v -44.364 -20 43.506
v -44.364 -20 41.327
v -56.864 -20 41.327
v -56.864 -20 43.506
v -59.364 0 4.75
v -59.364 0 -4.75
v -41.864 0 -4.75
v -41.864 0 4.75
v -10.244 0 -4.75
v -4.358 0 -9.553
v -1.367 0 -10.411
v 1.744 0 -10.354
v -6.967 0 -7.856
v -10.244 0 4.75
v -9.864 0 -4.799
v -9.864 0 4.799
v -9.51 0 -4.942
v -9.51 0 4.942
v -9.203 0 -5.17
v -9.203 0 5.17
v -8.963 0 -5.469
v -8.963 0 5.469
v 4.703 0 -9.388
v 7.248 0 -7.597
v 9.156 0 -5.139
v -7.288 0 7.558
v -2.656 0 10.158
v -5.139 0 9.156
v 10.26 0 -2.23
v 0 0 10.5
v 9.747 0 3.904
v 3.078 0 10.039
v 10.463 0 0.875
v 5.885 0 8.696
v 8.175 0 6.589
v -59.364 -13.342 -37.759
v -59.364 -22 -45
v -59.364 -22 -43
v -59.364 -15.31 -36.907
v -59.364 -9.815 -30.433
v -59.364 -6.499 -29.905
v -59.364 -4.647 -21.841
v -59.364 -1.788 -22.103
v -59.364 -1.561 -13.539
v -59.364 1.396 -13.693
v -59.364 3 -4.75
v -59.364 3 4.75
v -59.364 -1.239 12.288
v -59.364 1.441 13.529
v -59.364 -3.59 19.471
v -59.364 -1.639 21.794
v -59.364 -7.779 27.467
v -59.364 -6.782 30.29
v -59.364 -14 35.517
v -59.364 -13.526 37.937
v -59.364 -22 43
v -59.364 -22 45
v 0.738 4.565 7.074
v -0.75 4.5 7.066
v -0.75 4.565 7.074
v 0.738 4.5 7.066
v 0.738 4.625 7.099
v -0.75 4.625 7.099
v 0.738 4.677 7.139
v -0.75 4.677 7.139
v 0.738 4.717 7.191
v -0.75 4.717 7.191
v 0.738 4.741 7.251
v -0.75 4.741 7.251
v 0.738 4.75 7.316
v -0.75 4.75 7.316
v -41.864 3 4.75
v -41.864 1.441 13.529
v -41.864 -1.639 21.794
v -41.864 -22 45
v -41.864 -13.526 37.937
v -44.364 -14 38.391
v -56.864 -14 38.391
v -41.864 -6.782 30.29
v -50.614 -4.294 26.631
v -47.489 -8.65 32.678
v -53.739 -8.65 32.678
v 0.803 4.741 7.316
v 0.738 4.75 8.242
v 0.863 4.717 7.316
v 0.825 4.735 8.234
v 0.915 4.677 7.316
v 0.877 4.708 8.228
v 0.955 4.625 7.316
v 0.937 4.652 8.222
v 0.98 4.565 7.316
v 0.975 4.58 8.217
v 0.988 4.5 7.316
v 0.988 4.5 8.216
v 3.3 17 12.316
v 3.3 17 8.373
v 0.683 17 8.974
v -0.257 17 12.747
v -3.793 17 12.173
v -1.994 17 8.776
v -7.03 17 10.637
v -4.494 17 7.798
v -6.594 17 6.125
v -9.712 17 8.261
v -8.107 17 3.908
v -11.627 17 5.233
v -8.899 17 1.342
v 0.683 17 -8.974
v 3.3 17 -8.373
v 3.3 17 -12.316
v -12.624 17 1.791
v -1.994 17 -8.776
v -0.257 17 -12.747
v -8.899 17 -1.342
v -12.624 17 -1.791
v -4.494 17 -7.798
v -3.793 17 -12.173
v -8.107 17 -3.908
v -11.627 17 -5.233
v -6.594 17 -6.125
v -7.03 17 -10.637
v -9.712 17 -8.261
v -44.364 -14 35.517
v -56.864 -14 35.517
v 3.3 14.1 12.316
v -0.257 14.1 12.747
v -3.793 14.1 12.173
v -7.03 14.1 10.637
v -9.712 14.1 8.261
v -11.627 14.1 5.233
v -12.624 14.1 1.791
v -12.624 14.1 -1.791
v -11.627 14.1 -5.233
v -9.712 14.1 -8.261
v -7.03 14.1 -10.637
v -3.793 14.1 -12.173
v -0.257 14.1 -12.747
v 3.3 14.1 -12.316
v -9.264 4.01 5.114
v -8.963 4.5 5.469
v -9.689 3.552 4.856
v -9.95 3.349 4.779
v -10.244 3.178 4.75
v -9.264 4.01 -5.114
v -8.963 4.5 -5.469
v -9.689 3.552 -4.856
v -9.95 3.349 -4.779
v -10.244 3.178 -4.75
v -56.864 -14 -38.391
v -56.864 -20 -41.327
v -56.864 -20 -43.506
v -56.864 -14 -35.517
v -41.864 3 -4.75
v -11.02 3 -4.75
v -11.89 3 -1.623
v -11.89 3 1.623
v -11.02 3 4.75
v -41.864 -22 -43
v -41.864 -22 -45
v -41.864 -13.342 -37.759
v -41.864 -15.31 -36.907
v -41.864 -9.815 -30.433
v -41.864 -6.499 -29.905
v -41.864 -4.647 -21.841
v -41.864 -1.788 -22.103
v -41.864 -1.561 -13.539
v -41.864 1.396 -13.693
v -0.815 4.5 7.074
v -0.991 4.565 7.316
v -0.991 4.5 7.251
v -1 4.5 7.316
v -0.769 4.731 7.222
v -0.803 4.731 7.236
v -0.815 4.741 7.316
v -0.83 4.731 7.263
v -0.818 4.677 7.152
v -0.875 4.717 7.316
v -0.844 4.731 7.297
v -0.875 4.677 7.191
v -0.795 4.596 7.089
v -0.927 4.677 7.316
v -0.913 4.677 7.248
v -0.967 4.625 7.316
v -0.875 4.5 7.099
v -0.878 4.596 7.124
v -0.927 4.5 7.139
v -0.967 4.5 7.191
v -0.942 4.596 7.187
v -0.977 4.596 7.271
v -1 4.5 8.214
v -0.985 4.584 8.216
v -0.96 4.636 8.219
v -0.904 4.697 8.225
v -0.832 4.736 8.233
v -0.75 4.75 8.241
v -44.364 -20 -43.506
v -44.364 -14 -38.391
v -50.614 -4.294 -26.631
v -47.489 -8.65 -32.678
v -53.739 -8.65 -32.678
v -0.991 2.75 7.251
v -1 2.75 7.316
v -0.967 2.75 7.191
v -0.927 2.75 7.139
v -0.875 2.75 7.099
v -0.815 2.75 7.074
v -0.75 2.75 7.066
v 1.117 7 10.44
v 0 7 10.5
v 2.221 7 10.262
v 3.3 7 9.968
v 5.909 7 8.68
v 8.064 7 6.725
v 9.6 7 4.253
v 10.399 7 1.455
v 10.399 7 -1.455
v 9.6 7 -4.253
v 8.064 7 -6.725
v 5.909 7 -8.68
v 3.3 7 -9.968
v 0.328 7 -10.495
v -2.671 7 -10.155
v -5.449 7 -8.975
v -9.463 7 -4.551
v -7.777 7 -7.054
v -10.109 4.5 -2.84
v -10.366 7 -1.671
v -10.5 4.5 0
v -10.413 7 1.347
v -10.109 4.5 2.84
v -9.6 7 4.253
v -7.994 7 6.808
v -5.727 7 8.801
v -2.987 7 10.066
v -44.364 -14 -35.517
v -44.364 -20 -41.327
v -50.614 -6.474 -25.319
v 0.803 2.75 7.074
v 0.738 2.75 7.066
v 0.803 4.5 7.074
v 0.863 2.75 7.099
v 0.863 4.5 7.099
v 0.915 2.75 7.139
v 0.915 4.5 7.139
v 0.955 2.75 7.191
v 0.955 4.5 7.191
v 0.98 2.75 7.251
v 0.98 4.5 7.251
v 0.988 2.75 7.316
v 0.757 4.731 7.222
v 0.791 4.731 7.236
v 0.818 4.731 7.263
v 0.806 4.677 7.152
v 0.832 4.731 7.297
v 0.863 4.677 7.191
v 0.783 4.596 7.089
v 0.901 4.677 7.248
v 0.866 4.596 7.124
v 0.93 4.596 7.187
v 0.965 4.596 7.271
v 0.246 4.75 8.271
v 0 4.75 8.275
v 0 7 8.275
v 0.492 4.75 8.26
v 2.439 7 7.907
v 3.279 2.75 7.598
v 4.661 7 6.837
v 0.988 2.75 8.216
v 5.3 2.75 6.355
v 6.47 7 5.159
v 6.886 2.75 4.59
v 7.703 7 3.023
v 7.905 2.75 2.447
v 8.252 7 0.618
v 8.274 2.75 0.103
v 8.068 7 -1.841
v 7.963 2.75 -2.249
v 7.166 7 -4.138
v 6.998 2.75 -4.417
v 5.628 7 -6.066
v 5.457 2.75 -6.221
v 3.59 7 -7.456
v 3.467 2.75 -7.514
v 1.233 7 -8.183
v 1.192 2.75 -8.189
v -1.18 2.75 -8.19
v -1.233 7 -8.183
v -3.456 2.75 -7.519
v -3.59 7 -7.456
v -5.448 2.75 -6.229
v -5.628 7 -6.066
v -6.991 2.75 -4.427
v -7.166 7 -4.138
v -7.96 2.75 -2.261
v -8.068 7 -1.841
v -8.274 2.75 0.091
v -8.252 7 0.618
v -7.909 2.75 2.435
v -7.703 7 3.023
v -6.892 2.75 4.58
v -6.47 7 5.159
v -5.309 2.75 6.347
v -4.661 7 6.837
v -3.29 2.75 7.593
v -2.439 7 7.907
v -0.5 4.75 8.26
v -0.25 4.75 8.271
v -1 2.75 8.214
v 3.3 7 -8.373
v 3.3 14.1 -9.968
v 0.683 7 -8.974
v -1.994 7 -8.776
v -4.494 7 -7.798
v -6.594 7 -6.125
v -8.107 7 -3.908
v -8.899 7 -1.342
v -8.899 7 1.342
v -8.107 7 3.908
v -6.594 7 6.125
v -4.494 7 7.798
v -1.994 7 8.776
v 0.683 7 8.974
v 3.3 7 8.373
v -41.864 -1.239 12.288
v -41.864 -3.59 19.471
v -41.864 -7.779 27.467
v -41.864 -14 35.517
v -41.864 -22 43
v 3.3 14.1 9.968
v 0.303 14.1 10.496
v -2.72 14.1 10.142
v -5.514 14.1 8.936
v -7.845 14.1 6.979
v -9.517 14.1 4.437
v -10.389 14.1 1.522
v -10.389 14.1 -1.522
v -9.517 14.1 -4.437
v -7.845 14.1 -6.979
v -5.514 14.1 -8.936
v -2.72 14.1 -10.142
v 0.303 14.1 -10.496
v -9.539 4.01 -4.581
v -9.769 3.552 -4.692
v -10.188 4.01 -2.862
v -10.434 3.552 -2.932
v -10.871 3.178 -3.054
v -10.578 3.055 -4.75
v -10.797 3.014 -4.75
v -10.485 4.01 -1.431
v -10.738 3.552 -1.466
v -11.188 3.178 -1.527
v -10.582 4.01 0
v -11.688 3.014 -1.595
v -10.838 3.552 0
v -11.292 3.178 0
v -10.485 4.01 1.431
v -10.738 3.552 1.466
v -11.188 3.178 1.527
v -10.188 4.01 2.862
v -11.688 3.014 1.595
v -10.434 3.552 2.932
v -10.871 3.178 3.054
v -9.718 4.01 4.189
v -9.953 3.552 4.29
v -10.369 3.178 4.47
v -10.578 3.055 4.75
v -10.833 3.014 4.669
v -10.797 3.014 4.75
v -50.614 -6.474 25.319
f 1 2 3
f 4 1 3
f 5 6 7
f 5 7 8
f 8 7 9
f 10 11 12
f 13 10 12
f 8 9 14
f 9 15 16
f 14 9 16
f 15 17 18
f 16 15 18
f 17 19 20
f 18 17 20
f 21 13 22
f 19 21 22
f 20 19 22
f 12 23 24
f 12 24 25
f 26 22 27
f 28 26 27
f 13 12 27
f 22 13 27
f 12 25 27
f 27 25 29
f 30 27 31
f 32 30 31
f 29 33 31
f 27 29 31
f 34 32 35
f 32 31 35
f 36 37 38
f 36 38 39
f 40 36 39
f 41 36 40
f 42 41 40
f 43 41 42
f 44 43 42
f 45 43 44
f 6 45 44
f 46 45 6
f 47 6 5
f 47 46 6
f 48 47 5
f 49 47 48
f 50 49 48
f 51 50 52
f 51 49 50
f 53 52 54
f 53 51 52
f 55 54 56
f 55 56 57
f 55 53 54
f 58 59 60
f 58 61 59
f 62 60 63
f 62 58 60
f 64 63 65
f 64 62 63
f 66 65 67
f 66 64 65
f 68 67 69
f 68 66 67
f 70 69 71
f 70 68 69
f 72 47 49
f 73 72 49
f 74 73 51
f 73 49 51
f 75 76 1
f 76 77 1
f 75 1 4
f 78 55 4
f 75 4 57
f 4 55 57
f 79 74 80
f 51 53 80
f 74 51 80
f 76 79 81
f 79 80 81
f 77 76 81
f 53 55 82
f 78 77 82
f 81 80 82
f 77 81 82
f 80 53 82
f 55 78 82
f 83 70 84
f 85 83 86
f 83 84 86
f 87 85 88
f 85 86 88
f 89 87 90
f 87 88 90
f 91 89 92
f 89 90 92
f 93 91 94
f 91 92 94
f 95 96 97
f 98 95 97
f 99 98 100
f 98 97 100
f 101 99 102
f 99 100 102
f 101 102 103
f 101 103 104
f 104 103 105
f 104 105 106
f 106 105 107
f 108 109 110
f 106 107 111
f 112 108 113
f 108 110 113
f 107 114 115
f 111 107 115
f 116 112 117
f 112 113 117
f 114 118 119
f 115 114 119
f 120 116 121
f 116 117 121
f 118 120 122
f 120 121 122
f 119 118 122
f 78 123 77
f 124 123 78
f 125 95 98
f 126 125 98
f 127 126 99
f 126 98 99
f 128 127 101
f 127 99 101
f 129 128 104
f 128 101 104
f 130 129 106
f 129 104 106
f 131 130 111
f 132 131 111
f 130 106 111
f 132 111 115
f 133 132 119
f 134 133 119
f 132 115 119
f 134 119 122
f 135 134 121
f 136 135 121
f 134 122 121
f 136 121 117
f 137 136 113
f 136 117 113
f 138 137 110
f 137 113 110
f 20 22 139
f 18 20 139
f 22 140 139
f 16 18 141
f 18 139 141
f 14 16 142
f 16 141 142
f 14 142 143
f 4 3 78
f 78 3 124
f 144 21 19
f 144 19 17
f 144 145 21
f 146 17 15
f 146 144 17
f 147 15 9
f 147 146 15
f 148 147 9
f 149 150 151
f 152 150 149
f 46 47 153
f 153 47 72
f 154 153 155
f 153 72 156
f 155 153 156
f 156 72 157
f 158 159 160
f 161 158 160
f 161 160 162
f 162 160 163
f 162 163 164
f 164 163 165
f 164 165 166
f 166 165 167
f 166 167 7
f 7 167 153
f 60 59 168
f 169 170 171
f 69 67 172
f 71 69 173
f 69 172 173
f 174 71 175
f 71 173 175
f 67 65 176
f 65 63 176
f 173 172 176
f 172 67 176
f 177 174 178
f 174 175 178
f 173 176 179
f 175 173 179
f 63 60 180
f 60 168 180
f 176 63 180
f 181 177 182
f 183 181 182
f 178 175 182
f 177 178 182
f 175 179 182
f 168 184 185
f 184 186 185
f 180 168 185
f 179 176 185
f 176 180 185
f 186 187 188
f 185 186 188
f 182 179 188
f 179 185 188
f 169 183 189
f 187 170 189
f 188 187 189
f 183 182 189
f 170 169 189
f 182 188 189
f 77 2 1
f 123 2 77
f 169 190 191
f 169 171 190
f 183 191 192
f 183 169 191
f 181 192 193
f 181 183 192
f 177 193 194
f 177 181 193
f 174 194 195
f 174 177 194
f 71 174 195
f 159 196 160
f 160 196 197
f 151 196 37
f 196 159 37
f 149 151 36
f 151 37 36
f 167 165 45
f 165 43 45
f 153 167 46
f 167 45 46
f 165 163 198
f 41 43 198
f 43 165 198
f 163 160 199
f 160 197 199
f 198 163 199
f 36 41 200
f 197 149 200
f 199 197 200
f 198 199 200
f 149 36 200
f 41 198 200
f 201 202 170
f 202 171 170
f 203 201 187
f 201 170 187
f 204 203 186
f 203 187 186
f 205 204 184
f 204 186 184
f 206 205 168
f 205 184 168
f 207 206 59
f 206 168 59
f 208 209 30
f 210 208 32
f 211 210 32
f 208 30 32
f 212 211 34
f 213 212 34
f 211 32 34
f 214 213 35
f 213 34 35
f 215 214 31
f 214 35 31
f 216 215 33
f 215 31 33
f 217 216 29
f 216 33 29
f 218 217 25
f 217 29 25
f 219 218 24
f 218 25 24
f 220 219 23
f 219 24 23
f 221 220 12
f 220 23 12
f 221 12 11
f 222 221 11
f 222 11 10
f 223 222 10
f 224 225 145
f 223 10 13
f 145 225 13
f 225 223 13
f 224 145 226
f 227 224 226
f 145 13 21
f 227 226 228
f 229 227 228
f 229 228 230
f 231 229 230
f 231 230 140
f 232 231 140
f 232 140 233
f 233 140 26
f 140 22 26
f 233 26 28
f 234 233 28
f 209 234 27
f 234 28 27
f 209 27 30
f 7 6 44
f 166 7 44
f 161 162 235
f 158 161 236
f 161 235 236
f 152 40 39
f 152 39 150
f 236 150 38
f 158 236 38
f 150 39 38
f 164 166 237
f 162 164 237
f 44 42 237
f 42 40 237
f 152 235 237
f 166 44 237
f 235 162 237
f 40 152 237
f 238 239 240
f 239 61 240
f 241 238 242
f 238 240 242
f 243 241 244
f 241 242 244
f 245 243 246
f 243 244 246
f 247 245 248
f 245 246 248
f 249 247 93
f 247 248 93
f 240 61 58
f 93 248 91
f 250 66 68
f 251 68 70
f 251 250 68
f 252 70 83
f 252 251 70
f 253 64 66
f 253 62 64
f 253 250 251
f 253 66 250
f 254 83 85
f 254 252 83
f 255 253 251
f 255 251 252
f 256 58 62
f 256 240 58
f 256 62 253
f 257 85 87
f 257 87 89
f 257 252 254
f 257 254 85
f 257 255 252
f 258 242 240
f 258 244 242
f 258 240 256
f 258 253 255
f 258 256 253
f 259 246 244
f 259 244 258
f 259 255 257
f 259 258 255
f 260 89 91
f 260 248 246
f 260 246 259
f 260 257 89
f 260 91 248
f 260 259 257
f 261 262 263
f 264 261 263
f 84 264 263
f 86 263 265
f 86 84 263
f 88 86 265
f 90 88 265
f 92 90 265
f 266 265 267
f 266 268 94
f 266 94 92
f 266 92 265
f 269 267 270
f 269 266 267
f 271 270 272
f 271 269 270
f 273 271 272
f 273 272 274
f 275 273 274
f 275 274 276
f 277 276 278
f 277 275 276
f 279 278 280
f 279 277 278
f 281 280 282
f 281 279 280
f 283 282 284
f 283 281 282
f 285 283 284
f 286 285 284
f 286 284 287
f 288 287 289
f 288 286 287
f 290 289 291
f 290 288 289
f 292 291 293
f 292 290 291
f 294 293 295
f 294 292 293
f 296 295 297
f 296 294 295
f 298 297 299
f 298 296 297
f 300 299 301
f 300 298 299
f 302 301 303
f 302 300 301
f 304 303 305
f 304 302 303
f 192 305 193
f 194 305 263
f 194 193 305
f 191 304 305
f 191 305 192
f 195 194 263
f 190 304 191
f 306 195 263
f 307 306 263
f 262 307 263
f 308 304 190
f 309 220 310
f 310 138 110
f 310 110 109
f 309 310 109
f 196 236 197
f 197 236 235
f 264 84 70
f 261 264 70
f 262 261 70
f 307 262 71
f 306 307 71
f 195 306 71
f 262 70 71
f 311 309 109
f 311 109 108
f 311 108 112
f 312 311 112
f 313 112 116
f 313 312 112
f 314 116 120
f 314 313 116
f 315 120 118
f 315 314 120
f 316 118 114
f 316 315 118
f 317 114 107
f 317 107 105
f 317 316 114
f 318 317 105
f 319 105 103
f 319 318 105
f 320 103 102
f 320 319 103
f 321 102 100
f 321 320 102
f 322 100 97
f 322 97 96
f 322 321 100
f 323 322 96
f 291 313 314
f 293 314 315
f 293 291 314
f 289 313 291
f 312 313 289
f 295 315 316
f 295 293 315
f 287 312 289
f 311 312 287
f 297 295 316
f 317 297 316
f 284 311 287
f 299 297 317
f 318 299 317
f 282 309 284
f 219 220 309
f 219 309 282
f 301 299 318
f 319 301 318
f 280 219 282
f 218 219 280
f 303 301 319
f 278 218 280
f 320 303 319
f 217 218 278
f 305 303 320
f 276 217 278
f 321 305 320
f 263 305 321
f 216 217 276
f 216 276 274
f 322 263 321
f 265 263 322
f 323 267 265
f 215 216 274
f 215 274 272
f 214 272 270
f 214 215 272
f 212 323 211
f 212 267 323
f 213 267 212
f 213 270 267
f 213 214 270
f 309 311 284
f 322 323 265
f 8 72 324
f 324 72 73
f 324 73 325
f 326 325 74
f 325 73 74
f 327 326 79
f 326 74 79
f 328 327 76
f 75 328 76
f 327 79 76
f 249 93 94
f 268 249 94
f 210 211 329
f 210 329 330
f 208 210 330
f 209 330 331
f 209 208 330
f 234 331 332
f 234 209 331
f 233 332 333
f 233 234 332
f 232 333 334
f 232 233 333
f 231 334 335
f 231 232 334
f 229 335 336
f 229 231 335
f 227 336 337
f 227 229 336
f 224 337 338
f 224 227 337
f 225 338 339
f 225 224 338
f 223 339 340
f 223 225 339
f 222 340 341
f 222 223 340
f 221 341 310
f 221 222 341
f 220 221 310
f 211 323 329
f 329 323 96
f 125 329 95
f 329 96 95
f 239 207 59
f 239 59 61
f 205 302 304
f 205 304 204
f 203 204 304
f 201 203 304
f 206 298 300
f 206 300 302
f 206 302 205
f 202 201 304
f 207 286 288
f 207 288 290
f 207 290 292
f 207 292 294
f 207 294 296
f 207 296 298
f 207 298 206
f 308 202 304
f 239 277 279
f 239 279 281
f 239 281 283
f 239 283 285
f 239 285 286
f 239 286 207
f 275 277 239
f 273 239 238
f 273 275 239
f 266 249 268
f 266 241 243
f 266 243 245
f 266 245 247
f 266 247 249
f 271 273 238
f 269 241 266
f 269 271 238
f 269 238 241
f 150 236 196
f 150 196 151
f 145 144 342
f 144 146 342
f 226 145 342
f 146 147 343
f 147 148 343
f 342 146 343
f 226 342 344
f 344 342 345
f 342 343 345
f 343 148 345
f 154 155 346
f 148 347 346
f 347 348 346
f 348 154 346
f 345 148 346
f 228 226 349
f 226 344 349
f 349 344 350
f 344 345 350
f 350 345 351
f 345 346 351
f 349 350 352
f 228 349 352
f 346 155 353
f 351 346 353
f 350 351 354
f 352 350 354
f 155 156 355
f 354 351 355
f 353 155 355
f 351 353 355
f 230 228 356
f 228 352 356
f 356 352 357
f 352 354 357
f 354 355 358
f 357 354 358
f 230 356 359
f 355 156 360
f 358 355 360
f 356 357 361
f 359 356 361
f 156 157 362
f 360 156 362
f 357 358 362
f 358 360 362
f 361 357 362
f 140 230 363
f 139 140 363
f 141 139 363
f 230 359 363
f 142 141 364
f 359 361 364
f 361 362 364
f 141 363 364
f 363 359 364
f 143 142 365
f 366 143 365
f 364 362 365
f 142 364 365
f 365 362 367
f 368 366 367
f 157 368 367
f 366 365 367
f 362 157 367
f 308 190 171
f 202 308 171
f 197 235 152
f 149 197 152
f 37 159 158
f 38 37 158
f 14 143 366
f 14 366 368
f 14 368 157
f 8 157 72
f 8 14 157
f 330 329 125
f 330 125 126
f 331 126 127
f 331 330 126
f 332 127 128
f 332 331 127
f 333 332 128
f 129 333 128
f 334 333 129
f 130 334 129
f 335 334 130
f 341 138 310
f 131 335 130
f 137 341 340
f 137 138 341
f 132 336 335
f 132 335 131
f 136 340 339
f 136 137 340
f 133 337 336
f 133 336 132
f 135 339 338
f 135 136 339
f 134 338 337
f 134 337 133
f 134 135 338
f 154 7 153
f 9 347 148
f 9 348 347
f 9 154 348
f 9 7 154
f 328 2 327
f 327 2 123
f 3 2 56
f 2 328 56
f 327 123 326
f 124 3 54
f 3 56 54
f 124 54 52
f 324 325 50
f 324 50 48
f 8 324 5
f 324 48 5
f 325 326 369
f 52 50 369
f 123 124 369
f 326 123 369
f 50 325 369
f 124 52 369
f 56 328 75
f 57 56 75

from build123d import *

# Parameters (mm, degrees)
F_0_1MM_FIT_FOR_POT_R   = 10.5
BOSS_EXTRUDE1_DEPTH     = 2.75
SKETCH4_R               = 10.5
SKETCH4_R_2             = 8.275
BOSS_EXTRUDE2_DEPTH     = 4.25
BOSS_EXTRUDE3_DEPTH     = 2
FILLET1_R               = 0.25
BOSS_EXTRUDE6_DEPTH     = 10
BOSS_EXTRUDE7_DEPTH     = 2.9
BOSS_EXTRUDE8_DEPTH     = 3
FILLET2_R               = 1.5
BOSS_EXTRUDE9_DEPTH     = 17.5
SKETCH11_W              = 12.5
SKETCH11_H              = 6
CUT_EXTRUDE1_DEPTH      = 81.518110176
CUT_EXTRUDE1_DEPTH_BACK = 81.518110176


with BuildPart() as part:
    # 0.1mm fit for pot → Boss-Extrude1 (new body)
    with BuildSketch(Plane(origin=(0, 0, 0), x_dir=(1, 0, 0), z_dir=(0, 1, 0))):
        with Locations(Location((0, 0, 0), (0, 0, 270))):
            Circle(F_0_1MM_FIT_FOR_POT_R)
    extrude(amount=BOSS_EXTRUDE1_DEPTH)

    # Sketch4 → Boss-Extrude2 (add)
    with BuildSketch(Plane(origin=(0, 2.75, 0), x_dir=(1, 0, 0), z_dir=(0, 1, 0))):
        with Locations(Location((0, 0, 0), (0, 0, 270))):
            Circle(SKETCH4_R)
        with Locations(Location((0, 0, 0), (0, 0, 270))):
            Circle(SKETCH4_R_2, mode=Mode.SUBTRACT)
    extrude(amount=BOSS_EXTRUDE2_DEPTH)

    # Sketch5 → Boss-Extrude3 (add)
    with BuildSketch(Plane(origin=(0, 2.75, 0), x_dir=(1, 0, 0), z_dir=(0, 1, 0))):
        with BuildLine():
            Line((-1, -8.214354813), (-1, -7.065799598))
            Line((-1, -7.065799598), (0.988059701, -7.065799598))
            Line((0.988059701, -7.065799598), (0.988059701, -8.215799598))
            ThreePointArc((0.988059701, -8.215799598), (-0.006013695, -8.274997815), (-1, -8.214354813))
        make_face()
    extrude(amount=BOSS_EXTRUDE3_DEPTH)

    # Fillet1
    fillet1_edges = [part.edges().sort_by_distance(p)[0] for p in [
        (0.988059701, 3.75, 7.065799598),
        (-1, 3.75, 7.065799598),
        (-0.005970149, 4.75, 7.065799598),
        (-1, 4.75, 7.640077205),
        (0.988059701, 4.75, 7.640799598),
    ]]
    fillet(fillet1_edges, radius=FILLET1_R)

    # Sketch7 → Boss-Extrude6 (add)
    with BuildSketch(Plane(origin=(0, 7, 0), x_dir=(1, 0, 0), z_dir=(0, 1, 0))):
        with BuildLine():
            Line((3.299602194, 9.968080325), (3.299602194, 8.373328213))
            ThreePointArc((3.299602194, 8.373328213), (-9, 0), (3.299602194, -8.373328213))
            Line((3.299602194, -8.373328213), (3.299602194, -9.968080325))
            ThreePointArc((3.299602194, -9.968080325), (-10.5, 0), (3.299602194, 9.968080325))
        make_face()
    extrude(amount=BOSS_EXTRUDE6_DEPTH)

    # Sketch8 → Boss-Extrude7 (add)
    with BuildSketch(Plane(origin=(0, 17, 0), x_dir=(1, 0, 0), z_dir=(0, 1, 0))):
        with BuildLine():
            Line((3.299602194, 12.315645552), (3.299602194, 9.968080325))
            ThreePointArc((3.299602194, 9.968080325), (-10.5, 0), (3.299602194, -9.968080325))
            Line((3.299602194, -9.968080325), (3.299602194, -12.315645552))
            ThreePointArc((3.299602194, -12.315645552), (-12.75, 0), (3.299602194, 12.315645552))
        make_face()
    extrude(amount=-BOSS_EXTRUDE7_DEPTH)

    # Sketch9 → Boss-Extrude8 (add)
    with BuildSketch(Plane.XZ):
        with BuildLine():
            Line((-9.3641604, 4.75), (-59.3641604, 4.75))
            Line((-59.3641604, 4.75), (-59.3641604, -4.75))
            Line((-59.3641604, -4.75), (-9.3641604, -4.75))
            ThreePointArc((-9.3641604, -4.75), (-10.5, 0), (-9.3641604, 4.75))
        make_face()
    extrude(amount=-BOSS_EXTRUDE8_DEPTH)

    # Fillet2
    fillet2_edges = [part.edges().sort_by_distance(p)[0] for p in [
        (-10.5, 3, 0),
        (-9.3641604, 1.5, 4.75),
        (-9.3641604, 1.5, -4.75),
    ]]
    fillet(fillet2_edges, radius=FILLET2_R)

    # Sketch10 → Boss-Extrude9 (add)
    with BuildSketch(Plane.ZY.offset(59.3641604)):
        with BuildLine():
            Line((-45, -22), (-43, -22))
            add(Edge.make_bspline(
                [(-4.75, 0), (-26.762186457, -1.948698647), (-43, -22)],
                knots=[0.548592822, 0.548592822, 0.548592822, 1, 1, 1], degree=2))
            Line((-4.75, 0), (4.75, 0))
            add(Edge.make_bspline(
                [(43, -22), (26.762186461, -1.948698647), (4.75, 0)],
                knots=[0, 0, 0, 0.451407178, 0.451407178, 0.451407178], degree=2))
            Line((43, -22), (45, -22))
            add(Edge.make_bspline(
                [(4.75, 3), (28.386779804, 0.912348176), (45, -22)],
                knots=[0.545557352, 0.545557352, 0.545557352, 1, 1, 1], degree=2))
            Line((4.75, 3), (-4.75, 3))
            add(Edge.make_bspline(
                [(-45, -22), (-28.386779803, 0.912348176), (-4.75, 3)],
                knots=[0, 0, 0, 0.454442648, 0.454442648, 0.454442648], degree=2))
        make_face()
    extrude(amount=-BOSS_EXTRUDE9_DEPTH)

    # Sketch11 → Cut-Extrude1 (cut, two sides)
    with BuildSketch(Plane(origin=(0, 0, -4.75), x_dir=(-1, 0, 0), z_dir=(0, 0, -1))) as cut_extrude1_sk:
        with Locations((50.6141604, -17)):
            Rectangle(SKETCH11_W, SKETCH11_H)
    extrude(amount=CUT_EXTRUDE1_DEPTH, mode=Mode.SUBTRACT)
    extrude(cut_extrude1_sk.sketch, amount=-CUT_EXTRUDE1_DEPTH_BACK, mode=Mode.SUBTRACT)


solid = part.part
